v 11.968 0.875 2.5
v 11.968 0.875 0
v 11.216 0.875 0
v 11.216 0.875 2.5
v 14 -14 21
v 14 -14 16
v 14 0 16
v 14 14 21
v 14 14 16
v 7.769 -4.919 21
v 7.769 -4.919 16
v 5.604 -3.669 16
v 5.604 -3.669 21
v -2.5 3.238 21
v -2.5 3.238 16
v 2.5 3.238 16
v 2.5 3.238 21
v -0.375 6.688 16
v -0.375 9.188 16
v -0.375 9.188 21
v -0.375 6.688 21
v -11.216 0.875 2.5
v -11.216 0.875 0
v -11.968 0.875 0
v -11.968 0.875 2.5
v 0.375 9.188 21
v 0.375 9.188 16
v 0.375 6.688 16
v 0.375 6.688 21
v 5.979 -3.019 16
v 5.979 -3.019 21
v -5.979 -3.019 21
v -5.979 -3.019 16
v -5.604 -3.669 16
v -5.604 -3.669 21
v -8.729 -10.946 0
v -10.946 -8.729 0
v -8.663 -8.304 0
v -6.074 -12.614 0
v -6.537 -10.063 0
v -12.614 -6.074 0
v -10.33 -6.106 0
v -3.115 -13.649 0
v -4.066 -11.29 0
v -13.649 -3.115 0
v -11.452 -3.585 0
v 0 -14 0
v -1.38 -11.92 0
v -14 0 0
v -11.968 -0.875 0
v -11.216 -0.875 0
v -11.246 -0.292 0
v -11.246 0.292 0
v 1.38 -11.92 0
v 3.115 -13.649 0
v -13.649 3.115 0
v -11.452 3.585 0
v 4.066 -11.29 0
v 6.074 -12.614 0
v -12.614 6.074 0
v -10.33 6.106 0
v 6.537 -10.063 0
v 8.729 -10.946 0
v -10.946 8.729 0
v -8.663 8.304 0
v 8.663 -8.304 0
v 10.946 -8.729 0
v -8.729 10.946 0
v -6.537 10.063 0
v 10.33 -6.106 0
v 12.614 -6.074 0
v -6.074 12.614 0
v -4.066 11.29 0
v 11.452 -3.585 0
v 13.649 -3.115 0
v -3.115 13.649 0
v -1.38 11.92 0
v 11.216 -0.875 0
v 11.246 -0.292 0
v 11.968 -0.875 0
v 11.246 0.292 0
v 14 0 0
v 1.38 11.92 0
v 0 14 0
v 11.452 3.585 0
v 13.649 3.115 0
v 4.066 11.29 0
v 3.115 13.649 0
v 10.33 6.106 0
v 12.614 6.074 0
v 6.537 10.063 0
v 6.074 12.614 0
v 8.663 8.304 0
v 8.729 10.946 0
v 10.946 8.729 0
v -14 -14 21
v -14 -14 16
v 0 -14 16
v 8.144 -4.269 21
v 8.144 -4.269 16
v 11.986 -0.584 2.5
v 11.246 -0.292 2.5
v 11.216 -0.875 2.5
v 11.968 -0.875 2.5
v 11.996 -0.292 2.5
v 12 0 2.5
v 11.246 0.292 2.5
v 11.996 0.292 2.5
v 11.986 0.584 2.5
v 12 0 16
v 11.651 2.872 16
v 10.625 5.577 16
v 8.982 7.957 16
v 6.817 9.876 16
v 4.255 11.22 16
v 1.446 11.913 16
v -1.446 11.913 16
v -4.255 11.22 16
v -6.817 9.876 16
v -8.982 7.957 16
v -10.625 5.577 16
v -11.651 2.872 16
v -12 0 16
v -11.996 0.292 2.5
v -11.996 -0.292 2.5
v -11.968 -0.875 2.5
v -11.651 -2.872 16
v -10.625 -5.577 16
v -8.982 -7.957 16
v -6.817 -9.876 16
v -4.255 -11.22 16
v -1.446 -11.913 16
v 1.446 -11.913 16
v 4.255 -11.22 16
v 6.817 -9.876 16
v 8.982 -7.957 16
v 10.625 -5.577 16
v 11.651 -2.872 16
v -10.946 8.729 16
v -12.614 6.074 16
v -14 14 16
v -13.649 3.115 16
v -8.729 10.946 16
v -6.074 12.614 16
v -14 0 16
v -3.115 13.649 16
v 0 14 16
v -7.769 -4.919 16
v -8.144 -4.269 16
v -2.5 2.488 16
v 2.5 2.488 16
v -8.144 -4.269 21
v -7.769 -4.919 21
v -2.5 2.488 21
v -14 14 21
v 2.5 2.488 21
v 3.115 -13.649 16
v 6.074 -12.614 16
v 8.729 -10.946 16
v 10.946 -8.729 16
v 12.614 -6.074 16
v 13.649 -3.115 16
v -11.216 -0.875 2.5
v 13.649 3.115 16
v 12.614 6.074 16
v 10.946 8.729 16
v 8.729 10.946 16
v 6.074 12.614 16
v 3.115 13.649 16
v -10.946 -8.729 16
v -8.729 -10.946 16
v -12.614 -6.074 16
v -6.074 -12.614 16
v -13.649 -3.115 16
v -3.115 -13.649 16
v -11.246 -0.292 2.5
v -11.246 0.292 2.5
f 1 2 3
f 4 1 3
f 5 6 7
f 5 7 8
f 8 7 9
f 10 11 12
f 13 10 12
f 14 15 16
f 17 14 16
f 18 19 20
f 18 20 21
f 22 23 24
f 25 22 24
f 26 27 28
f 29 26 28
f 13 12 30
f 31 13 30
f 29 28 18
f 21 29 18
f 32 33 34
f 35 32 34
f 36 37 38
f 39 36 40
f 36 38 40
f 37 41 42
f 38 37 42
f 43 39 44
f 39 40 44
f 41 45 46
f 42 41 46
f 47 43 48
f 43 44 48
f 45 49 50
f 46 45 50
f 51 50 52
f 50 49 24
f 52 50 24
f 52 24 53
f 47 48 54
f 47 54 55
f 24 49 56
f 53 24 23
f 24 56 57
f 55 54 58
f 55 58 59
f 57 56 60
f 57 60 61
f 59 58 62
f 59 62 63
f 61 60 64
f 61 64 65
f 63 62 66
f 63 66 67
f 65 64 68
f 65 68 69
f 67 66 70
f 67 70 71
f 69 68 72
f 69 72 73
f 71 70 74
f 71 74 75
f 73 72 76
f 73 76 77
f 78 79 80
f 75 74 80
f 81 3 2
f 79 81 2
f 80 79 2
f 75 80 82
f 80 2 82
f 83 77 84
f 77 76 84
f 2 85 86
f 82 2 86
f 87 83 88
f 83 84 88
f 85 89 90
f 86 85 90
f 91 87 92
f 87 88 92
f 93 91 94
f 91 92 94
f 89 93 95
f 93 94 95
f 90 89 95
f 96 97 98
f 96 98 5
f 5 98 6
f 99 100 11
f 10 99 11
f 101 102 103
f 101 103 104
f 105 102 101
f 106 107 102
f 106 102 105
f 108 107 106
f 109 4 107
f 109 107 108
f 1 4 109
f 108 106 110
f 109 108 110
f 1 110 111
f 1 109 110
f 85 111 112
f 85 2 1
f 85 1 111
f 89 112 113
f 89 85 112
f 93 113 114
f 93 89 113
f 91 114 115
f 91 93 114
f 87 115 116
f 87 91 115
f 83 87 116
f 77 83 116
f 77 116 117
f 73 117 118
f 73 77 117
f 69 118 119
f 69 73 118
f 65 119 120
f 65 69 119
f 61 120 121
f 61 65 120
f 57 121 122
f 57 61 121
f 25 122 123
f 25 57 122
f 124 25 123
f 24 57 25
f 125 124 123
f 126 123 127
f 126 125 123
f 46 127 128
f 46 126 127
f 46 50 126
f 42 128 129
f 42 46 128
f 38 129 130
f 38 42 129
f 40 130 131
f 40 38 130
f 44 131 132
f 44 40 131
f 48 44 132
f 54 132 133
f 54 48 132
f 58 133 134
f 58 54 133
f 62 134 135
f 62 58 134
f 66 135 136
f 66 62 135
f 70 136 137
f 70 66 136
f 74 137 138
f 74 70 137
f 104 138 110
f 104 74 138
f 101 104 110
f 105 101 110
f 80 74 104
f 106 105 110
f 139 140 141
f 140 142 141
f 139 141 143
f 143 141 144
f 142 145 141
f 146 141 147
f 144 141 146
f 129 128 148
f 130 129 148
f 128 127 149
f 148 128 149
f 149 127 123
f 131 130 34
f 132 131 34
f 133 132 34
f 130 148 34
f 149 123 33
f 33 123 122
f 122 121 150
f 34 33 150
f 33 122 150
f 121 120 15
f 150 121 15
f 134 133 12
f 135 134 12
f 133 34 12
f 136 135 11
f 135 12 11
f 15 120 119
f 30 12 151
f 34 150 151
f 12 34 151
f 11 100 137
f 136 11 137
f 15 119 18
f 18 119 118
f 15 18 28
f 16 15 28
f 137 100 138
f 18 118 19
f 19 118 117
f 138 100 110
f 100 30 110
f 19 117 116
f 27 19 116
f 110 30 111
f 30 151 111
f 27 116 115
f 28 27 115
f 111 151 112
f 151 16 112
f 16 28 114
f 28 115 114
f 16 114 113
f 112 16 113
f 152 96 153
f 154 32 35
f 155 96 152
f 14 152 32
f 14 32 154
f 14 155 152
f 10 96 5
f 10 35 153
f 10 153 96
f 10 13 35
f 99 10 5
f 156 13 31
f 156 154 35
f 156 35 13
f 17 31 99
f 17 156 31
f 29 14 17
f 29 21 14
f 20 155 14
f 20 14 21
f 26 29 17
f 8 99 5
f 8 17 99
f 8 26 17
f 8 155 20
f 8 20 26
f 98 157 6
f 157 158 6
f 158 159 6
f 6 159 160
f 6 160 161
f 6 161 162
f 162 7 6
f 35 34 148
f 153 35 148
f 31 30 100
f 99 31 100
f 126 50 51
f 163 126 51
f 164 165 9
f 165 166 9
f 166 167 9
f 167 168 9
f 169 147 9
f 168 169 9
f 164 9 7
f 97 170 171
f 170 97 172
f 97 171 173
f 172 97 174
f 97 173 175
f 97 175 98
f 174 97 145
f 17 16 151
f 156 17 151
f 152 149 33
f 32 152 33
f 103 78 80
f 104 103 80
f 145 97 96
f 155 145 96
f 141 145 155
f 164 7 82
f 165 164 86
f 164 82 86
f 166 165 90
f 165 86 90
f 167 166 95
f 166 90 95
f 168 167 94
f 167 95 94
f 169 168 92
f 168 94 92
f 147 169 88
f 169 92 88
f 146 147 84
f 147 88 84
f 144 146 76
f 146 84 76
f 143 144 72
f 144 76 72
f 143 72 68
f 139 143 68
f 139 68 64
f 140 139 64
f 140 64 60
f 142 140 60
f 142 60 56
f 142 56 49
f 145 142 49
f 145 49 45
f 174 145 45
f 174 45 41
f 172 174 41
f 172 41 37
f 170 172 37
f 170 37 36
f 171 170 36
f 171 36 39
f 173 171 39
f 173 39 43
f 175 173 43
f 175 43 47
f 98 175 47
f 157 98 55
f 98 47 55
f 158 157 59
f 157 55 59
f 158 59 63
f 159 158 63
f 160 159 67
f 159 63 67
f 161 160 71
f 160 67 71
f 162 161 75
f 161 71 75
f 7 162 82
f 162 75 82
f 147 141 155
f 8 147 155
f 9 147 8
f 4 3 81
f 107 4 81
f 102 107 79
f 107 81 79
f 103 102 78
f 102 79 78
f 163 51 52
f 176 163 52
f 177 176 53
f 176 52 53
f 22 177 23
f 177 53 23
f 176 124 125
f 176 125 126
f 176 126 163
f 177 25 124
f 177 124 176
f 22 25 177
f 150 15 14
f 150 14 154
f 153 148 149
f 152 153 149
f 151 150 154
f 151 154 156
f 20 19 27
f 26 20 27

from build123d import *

# Parameters (mm, degrees)
F0_R     = 14
F0_R_2   = 12
F1_DEPTH = 16
F3_DEPTH = 2.5
F4_W     = 28
F4_H     = 28
F5_DEPTH = 5
F6_W     = 5
F6_H     = 0.75
F6_W_2   = 0.375
F6_H_2   = 2.5
F7_DEPTH = 5.001


with BuildPart() as f1:
    # F0 (on Top) → F1 (new body)
    with BuildSketch(Plane.XY):
        Circle(F0_R)
        Circle(F0_R_2, mode=Mode.SUBTRACT)
    extrude(amount=F1_DEPTH)

    # F2 (on Top) → F3 (join)
    with BuildSketch(Plane.XY):
        with BuildLine():
            Line((-11.2159206042, 0.875), (-11.968056442, 0.875))
            ThreePointArc((-11.968056442, 0.875), (-12, 0), (-11.968056442, -0.875))
            Line((-11.968056442, -0.875), (-11.2159206042, -0.875))
            ThreePointArc((-11.2159206042, -0.875), (-11.25, 0), (-11.2159206042, 0.875))
        make_face()
        with BuildLine():
            ThreePointArc((11.968056442, -0.875), (12, 0), (11.968056442, 0.875))
            Line((11.968056442, 0.875), (11.2159206042, 0.875))
            ThreePointArc((11.2159206042, 0.875), (11.25, 0), (11.2159206042, -0.875))
            Line((11.2159206042, -0.875), (11.968056442, -0.875))
        make_face()
    extrude(amount=F3_DEPTH)

    # F4 (on face) → F5 (join)
    with BuildSketch(Plane.XY.offset(16)):
        Rectangle(F4_W, F4_H)
    extrude(amount=F5_DEPTH)

    # F6 (on face) → F7 (cut, through all)
    with BuildSketch(Plane(origin=(0, 0, 16), x_dir=(1, 0, 0), z_dir=(0, 0, -1))):
        with Locations((0, -2.8625)):
            Rectangle(F6_W, F6_H)
        with Locations((0.1875, -7.9375)):
            Rectangle(F6_W_2, F6_H_2)
        with Locations((-0.1875, -7.9375)):
            Rectangle(F6_W_2, F6_H_2)
        Polygon((5.6040448878, 3.6685095264), (5.7915448878, 3.34375), (7.9566083973, 4.59375), (7.7691083973, 4.9185095264), align=None)
        Polygon((7.9566083973, 4.59375), (5.7915448878, 3.34375), (5.9790448878, 3.0189904736), (8.1441083973, 4.2689904736), align=None)
        Polygon((-5.9790448878, 3.0189904736), (-5.7915448878, 3.34375), (-7.9566083973, 4.59375), (-8.1441083973, 4.2689904736), align=None)
        Polygon((-7.9566083973, 4.59375), (-5.7915448878, 3.34375), (-5.6040448878, 3.6685095264), (-7.7691083973, 4.9185095264), align=None)
    extrude(amount=-F7_DEPTH, mode=Mode.SUBTRACT)


solid = f1.part
